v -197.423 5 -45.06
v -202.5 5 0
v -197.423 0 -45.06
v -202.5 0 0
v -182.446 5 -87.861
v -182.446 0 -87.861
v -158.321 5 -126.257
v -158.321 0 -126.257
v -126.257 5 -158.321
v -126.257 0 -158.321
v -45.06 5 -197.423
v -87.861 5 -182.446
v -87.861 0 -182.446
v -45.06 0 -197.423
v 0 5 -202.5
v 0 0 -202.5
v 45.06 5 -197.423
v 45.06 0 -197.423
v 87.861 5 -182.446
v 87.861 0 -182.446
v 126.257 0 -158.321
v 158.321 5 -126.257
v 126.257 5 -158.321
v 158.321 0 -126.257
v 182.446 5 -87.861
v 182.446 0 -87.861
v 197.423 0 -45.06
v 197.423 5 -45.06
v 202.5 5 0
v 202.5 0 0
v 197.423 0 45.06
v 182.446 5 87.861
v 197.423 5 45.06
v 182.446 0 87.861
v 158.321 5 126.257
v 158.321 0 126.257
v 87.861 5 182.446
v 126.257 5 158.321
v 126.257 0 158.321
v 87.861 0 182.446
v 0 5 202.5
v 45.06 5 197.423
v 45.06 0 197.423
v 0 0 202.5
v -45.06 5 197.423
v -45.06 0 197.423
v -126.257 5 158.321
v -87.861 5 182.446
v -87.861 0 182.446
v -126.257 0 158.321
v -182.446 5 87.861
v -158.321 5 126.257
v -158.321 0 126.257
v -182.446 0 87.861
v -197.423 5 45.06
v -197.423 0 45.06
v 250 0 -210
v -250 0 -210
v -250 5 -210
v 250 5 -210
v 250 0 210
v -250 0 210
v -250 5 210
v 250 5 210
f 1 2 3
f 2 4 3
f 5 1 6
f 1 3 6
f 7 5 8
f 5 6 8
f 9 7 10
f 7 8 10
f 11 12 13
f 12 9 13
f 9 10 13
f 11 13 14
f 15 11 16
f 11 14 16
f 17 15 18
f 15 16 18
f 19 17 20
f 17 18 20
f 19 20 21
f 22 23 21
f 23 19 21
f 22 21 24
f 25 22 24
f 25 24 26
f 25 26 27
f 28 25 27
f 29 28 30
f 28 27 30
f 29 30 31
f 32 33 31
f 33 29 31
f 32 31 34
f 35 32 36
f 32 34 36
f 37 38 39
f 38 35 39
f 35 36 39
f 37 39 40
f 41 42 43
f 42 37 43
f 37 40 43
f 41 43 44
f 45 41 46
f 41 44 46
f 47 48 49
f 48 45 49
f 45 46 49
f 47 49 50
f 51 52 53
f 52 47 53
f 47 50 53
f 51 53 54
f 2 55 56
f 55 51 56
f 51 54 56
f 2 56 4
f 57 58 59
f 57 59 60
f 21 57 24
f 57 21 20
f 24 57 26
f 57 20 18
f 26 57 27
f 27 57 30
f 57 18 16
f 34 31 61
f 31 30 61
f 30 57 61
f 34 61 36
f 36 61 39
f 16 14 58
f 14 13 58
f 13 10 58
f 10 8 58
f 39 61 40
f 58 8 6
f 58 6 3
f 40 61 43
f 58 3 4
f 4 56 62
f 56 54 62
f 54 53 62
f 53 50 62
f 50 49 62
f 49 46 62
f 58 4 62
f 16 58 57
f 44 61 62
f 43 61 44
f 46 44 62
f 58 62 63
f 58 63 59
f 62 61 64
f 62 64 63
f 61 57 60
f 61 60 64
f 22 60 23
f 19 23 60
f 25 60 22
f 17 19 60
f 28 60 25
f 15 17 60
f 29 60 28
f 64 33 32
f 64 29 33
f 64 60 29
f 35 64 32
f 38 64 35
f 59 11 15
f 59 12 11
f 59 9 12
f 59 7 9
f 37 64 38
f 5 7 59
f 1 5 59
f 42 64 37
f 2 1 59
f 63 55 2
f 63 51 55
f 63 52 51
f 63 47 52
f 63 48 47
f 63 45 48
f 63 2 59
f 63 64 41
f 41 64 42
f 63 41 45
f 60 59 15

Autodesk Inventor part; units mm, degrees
ref_plane "YZ Plane" through (0, 0, 0) normal (1, 0, 0) x (0, 1, 0)
ref_plane "XZ Plane" through (0, 0, 0) normal (0, 1, 0) x (-1, 0, 0)
ref_plane "XY Plane" through (0, 0, 0) normal (0, 0, 1) x (1, 0, 0)
sketch "Skizze1" plane through (0, 0, 0) normal (0, 1, 0) x (-1, 0, 0)
  line L0 (-250, 210) -> (250, 210)
  line L1 (250, 210) -> (250, -210)
  line L2 (250, -210) -> (-250, -210)
  line L3 (-250, -210) -> (-250, 210)
  line L4 (-250, 210) -> (250, -210) construction
  line L5 (250, 210) -> (-250, -210) construction
  circle A0 centre (0, 0) radius 202.5
  dimension "d0" = 500
  dimension "d1" = 420
  dimension "d2" = 405
extrude "Extrusion1" add sketch "Skizze1" along normal blind 5
properties part number "Boden_drehscheibe" material "Holz (Birke)"
